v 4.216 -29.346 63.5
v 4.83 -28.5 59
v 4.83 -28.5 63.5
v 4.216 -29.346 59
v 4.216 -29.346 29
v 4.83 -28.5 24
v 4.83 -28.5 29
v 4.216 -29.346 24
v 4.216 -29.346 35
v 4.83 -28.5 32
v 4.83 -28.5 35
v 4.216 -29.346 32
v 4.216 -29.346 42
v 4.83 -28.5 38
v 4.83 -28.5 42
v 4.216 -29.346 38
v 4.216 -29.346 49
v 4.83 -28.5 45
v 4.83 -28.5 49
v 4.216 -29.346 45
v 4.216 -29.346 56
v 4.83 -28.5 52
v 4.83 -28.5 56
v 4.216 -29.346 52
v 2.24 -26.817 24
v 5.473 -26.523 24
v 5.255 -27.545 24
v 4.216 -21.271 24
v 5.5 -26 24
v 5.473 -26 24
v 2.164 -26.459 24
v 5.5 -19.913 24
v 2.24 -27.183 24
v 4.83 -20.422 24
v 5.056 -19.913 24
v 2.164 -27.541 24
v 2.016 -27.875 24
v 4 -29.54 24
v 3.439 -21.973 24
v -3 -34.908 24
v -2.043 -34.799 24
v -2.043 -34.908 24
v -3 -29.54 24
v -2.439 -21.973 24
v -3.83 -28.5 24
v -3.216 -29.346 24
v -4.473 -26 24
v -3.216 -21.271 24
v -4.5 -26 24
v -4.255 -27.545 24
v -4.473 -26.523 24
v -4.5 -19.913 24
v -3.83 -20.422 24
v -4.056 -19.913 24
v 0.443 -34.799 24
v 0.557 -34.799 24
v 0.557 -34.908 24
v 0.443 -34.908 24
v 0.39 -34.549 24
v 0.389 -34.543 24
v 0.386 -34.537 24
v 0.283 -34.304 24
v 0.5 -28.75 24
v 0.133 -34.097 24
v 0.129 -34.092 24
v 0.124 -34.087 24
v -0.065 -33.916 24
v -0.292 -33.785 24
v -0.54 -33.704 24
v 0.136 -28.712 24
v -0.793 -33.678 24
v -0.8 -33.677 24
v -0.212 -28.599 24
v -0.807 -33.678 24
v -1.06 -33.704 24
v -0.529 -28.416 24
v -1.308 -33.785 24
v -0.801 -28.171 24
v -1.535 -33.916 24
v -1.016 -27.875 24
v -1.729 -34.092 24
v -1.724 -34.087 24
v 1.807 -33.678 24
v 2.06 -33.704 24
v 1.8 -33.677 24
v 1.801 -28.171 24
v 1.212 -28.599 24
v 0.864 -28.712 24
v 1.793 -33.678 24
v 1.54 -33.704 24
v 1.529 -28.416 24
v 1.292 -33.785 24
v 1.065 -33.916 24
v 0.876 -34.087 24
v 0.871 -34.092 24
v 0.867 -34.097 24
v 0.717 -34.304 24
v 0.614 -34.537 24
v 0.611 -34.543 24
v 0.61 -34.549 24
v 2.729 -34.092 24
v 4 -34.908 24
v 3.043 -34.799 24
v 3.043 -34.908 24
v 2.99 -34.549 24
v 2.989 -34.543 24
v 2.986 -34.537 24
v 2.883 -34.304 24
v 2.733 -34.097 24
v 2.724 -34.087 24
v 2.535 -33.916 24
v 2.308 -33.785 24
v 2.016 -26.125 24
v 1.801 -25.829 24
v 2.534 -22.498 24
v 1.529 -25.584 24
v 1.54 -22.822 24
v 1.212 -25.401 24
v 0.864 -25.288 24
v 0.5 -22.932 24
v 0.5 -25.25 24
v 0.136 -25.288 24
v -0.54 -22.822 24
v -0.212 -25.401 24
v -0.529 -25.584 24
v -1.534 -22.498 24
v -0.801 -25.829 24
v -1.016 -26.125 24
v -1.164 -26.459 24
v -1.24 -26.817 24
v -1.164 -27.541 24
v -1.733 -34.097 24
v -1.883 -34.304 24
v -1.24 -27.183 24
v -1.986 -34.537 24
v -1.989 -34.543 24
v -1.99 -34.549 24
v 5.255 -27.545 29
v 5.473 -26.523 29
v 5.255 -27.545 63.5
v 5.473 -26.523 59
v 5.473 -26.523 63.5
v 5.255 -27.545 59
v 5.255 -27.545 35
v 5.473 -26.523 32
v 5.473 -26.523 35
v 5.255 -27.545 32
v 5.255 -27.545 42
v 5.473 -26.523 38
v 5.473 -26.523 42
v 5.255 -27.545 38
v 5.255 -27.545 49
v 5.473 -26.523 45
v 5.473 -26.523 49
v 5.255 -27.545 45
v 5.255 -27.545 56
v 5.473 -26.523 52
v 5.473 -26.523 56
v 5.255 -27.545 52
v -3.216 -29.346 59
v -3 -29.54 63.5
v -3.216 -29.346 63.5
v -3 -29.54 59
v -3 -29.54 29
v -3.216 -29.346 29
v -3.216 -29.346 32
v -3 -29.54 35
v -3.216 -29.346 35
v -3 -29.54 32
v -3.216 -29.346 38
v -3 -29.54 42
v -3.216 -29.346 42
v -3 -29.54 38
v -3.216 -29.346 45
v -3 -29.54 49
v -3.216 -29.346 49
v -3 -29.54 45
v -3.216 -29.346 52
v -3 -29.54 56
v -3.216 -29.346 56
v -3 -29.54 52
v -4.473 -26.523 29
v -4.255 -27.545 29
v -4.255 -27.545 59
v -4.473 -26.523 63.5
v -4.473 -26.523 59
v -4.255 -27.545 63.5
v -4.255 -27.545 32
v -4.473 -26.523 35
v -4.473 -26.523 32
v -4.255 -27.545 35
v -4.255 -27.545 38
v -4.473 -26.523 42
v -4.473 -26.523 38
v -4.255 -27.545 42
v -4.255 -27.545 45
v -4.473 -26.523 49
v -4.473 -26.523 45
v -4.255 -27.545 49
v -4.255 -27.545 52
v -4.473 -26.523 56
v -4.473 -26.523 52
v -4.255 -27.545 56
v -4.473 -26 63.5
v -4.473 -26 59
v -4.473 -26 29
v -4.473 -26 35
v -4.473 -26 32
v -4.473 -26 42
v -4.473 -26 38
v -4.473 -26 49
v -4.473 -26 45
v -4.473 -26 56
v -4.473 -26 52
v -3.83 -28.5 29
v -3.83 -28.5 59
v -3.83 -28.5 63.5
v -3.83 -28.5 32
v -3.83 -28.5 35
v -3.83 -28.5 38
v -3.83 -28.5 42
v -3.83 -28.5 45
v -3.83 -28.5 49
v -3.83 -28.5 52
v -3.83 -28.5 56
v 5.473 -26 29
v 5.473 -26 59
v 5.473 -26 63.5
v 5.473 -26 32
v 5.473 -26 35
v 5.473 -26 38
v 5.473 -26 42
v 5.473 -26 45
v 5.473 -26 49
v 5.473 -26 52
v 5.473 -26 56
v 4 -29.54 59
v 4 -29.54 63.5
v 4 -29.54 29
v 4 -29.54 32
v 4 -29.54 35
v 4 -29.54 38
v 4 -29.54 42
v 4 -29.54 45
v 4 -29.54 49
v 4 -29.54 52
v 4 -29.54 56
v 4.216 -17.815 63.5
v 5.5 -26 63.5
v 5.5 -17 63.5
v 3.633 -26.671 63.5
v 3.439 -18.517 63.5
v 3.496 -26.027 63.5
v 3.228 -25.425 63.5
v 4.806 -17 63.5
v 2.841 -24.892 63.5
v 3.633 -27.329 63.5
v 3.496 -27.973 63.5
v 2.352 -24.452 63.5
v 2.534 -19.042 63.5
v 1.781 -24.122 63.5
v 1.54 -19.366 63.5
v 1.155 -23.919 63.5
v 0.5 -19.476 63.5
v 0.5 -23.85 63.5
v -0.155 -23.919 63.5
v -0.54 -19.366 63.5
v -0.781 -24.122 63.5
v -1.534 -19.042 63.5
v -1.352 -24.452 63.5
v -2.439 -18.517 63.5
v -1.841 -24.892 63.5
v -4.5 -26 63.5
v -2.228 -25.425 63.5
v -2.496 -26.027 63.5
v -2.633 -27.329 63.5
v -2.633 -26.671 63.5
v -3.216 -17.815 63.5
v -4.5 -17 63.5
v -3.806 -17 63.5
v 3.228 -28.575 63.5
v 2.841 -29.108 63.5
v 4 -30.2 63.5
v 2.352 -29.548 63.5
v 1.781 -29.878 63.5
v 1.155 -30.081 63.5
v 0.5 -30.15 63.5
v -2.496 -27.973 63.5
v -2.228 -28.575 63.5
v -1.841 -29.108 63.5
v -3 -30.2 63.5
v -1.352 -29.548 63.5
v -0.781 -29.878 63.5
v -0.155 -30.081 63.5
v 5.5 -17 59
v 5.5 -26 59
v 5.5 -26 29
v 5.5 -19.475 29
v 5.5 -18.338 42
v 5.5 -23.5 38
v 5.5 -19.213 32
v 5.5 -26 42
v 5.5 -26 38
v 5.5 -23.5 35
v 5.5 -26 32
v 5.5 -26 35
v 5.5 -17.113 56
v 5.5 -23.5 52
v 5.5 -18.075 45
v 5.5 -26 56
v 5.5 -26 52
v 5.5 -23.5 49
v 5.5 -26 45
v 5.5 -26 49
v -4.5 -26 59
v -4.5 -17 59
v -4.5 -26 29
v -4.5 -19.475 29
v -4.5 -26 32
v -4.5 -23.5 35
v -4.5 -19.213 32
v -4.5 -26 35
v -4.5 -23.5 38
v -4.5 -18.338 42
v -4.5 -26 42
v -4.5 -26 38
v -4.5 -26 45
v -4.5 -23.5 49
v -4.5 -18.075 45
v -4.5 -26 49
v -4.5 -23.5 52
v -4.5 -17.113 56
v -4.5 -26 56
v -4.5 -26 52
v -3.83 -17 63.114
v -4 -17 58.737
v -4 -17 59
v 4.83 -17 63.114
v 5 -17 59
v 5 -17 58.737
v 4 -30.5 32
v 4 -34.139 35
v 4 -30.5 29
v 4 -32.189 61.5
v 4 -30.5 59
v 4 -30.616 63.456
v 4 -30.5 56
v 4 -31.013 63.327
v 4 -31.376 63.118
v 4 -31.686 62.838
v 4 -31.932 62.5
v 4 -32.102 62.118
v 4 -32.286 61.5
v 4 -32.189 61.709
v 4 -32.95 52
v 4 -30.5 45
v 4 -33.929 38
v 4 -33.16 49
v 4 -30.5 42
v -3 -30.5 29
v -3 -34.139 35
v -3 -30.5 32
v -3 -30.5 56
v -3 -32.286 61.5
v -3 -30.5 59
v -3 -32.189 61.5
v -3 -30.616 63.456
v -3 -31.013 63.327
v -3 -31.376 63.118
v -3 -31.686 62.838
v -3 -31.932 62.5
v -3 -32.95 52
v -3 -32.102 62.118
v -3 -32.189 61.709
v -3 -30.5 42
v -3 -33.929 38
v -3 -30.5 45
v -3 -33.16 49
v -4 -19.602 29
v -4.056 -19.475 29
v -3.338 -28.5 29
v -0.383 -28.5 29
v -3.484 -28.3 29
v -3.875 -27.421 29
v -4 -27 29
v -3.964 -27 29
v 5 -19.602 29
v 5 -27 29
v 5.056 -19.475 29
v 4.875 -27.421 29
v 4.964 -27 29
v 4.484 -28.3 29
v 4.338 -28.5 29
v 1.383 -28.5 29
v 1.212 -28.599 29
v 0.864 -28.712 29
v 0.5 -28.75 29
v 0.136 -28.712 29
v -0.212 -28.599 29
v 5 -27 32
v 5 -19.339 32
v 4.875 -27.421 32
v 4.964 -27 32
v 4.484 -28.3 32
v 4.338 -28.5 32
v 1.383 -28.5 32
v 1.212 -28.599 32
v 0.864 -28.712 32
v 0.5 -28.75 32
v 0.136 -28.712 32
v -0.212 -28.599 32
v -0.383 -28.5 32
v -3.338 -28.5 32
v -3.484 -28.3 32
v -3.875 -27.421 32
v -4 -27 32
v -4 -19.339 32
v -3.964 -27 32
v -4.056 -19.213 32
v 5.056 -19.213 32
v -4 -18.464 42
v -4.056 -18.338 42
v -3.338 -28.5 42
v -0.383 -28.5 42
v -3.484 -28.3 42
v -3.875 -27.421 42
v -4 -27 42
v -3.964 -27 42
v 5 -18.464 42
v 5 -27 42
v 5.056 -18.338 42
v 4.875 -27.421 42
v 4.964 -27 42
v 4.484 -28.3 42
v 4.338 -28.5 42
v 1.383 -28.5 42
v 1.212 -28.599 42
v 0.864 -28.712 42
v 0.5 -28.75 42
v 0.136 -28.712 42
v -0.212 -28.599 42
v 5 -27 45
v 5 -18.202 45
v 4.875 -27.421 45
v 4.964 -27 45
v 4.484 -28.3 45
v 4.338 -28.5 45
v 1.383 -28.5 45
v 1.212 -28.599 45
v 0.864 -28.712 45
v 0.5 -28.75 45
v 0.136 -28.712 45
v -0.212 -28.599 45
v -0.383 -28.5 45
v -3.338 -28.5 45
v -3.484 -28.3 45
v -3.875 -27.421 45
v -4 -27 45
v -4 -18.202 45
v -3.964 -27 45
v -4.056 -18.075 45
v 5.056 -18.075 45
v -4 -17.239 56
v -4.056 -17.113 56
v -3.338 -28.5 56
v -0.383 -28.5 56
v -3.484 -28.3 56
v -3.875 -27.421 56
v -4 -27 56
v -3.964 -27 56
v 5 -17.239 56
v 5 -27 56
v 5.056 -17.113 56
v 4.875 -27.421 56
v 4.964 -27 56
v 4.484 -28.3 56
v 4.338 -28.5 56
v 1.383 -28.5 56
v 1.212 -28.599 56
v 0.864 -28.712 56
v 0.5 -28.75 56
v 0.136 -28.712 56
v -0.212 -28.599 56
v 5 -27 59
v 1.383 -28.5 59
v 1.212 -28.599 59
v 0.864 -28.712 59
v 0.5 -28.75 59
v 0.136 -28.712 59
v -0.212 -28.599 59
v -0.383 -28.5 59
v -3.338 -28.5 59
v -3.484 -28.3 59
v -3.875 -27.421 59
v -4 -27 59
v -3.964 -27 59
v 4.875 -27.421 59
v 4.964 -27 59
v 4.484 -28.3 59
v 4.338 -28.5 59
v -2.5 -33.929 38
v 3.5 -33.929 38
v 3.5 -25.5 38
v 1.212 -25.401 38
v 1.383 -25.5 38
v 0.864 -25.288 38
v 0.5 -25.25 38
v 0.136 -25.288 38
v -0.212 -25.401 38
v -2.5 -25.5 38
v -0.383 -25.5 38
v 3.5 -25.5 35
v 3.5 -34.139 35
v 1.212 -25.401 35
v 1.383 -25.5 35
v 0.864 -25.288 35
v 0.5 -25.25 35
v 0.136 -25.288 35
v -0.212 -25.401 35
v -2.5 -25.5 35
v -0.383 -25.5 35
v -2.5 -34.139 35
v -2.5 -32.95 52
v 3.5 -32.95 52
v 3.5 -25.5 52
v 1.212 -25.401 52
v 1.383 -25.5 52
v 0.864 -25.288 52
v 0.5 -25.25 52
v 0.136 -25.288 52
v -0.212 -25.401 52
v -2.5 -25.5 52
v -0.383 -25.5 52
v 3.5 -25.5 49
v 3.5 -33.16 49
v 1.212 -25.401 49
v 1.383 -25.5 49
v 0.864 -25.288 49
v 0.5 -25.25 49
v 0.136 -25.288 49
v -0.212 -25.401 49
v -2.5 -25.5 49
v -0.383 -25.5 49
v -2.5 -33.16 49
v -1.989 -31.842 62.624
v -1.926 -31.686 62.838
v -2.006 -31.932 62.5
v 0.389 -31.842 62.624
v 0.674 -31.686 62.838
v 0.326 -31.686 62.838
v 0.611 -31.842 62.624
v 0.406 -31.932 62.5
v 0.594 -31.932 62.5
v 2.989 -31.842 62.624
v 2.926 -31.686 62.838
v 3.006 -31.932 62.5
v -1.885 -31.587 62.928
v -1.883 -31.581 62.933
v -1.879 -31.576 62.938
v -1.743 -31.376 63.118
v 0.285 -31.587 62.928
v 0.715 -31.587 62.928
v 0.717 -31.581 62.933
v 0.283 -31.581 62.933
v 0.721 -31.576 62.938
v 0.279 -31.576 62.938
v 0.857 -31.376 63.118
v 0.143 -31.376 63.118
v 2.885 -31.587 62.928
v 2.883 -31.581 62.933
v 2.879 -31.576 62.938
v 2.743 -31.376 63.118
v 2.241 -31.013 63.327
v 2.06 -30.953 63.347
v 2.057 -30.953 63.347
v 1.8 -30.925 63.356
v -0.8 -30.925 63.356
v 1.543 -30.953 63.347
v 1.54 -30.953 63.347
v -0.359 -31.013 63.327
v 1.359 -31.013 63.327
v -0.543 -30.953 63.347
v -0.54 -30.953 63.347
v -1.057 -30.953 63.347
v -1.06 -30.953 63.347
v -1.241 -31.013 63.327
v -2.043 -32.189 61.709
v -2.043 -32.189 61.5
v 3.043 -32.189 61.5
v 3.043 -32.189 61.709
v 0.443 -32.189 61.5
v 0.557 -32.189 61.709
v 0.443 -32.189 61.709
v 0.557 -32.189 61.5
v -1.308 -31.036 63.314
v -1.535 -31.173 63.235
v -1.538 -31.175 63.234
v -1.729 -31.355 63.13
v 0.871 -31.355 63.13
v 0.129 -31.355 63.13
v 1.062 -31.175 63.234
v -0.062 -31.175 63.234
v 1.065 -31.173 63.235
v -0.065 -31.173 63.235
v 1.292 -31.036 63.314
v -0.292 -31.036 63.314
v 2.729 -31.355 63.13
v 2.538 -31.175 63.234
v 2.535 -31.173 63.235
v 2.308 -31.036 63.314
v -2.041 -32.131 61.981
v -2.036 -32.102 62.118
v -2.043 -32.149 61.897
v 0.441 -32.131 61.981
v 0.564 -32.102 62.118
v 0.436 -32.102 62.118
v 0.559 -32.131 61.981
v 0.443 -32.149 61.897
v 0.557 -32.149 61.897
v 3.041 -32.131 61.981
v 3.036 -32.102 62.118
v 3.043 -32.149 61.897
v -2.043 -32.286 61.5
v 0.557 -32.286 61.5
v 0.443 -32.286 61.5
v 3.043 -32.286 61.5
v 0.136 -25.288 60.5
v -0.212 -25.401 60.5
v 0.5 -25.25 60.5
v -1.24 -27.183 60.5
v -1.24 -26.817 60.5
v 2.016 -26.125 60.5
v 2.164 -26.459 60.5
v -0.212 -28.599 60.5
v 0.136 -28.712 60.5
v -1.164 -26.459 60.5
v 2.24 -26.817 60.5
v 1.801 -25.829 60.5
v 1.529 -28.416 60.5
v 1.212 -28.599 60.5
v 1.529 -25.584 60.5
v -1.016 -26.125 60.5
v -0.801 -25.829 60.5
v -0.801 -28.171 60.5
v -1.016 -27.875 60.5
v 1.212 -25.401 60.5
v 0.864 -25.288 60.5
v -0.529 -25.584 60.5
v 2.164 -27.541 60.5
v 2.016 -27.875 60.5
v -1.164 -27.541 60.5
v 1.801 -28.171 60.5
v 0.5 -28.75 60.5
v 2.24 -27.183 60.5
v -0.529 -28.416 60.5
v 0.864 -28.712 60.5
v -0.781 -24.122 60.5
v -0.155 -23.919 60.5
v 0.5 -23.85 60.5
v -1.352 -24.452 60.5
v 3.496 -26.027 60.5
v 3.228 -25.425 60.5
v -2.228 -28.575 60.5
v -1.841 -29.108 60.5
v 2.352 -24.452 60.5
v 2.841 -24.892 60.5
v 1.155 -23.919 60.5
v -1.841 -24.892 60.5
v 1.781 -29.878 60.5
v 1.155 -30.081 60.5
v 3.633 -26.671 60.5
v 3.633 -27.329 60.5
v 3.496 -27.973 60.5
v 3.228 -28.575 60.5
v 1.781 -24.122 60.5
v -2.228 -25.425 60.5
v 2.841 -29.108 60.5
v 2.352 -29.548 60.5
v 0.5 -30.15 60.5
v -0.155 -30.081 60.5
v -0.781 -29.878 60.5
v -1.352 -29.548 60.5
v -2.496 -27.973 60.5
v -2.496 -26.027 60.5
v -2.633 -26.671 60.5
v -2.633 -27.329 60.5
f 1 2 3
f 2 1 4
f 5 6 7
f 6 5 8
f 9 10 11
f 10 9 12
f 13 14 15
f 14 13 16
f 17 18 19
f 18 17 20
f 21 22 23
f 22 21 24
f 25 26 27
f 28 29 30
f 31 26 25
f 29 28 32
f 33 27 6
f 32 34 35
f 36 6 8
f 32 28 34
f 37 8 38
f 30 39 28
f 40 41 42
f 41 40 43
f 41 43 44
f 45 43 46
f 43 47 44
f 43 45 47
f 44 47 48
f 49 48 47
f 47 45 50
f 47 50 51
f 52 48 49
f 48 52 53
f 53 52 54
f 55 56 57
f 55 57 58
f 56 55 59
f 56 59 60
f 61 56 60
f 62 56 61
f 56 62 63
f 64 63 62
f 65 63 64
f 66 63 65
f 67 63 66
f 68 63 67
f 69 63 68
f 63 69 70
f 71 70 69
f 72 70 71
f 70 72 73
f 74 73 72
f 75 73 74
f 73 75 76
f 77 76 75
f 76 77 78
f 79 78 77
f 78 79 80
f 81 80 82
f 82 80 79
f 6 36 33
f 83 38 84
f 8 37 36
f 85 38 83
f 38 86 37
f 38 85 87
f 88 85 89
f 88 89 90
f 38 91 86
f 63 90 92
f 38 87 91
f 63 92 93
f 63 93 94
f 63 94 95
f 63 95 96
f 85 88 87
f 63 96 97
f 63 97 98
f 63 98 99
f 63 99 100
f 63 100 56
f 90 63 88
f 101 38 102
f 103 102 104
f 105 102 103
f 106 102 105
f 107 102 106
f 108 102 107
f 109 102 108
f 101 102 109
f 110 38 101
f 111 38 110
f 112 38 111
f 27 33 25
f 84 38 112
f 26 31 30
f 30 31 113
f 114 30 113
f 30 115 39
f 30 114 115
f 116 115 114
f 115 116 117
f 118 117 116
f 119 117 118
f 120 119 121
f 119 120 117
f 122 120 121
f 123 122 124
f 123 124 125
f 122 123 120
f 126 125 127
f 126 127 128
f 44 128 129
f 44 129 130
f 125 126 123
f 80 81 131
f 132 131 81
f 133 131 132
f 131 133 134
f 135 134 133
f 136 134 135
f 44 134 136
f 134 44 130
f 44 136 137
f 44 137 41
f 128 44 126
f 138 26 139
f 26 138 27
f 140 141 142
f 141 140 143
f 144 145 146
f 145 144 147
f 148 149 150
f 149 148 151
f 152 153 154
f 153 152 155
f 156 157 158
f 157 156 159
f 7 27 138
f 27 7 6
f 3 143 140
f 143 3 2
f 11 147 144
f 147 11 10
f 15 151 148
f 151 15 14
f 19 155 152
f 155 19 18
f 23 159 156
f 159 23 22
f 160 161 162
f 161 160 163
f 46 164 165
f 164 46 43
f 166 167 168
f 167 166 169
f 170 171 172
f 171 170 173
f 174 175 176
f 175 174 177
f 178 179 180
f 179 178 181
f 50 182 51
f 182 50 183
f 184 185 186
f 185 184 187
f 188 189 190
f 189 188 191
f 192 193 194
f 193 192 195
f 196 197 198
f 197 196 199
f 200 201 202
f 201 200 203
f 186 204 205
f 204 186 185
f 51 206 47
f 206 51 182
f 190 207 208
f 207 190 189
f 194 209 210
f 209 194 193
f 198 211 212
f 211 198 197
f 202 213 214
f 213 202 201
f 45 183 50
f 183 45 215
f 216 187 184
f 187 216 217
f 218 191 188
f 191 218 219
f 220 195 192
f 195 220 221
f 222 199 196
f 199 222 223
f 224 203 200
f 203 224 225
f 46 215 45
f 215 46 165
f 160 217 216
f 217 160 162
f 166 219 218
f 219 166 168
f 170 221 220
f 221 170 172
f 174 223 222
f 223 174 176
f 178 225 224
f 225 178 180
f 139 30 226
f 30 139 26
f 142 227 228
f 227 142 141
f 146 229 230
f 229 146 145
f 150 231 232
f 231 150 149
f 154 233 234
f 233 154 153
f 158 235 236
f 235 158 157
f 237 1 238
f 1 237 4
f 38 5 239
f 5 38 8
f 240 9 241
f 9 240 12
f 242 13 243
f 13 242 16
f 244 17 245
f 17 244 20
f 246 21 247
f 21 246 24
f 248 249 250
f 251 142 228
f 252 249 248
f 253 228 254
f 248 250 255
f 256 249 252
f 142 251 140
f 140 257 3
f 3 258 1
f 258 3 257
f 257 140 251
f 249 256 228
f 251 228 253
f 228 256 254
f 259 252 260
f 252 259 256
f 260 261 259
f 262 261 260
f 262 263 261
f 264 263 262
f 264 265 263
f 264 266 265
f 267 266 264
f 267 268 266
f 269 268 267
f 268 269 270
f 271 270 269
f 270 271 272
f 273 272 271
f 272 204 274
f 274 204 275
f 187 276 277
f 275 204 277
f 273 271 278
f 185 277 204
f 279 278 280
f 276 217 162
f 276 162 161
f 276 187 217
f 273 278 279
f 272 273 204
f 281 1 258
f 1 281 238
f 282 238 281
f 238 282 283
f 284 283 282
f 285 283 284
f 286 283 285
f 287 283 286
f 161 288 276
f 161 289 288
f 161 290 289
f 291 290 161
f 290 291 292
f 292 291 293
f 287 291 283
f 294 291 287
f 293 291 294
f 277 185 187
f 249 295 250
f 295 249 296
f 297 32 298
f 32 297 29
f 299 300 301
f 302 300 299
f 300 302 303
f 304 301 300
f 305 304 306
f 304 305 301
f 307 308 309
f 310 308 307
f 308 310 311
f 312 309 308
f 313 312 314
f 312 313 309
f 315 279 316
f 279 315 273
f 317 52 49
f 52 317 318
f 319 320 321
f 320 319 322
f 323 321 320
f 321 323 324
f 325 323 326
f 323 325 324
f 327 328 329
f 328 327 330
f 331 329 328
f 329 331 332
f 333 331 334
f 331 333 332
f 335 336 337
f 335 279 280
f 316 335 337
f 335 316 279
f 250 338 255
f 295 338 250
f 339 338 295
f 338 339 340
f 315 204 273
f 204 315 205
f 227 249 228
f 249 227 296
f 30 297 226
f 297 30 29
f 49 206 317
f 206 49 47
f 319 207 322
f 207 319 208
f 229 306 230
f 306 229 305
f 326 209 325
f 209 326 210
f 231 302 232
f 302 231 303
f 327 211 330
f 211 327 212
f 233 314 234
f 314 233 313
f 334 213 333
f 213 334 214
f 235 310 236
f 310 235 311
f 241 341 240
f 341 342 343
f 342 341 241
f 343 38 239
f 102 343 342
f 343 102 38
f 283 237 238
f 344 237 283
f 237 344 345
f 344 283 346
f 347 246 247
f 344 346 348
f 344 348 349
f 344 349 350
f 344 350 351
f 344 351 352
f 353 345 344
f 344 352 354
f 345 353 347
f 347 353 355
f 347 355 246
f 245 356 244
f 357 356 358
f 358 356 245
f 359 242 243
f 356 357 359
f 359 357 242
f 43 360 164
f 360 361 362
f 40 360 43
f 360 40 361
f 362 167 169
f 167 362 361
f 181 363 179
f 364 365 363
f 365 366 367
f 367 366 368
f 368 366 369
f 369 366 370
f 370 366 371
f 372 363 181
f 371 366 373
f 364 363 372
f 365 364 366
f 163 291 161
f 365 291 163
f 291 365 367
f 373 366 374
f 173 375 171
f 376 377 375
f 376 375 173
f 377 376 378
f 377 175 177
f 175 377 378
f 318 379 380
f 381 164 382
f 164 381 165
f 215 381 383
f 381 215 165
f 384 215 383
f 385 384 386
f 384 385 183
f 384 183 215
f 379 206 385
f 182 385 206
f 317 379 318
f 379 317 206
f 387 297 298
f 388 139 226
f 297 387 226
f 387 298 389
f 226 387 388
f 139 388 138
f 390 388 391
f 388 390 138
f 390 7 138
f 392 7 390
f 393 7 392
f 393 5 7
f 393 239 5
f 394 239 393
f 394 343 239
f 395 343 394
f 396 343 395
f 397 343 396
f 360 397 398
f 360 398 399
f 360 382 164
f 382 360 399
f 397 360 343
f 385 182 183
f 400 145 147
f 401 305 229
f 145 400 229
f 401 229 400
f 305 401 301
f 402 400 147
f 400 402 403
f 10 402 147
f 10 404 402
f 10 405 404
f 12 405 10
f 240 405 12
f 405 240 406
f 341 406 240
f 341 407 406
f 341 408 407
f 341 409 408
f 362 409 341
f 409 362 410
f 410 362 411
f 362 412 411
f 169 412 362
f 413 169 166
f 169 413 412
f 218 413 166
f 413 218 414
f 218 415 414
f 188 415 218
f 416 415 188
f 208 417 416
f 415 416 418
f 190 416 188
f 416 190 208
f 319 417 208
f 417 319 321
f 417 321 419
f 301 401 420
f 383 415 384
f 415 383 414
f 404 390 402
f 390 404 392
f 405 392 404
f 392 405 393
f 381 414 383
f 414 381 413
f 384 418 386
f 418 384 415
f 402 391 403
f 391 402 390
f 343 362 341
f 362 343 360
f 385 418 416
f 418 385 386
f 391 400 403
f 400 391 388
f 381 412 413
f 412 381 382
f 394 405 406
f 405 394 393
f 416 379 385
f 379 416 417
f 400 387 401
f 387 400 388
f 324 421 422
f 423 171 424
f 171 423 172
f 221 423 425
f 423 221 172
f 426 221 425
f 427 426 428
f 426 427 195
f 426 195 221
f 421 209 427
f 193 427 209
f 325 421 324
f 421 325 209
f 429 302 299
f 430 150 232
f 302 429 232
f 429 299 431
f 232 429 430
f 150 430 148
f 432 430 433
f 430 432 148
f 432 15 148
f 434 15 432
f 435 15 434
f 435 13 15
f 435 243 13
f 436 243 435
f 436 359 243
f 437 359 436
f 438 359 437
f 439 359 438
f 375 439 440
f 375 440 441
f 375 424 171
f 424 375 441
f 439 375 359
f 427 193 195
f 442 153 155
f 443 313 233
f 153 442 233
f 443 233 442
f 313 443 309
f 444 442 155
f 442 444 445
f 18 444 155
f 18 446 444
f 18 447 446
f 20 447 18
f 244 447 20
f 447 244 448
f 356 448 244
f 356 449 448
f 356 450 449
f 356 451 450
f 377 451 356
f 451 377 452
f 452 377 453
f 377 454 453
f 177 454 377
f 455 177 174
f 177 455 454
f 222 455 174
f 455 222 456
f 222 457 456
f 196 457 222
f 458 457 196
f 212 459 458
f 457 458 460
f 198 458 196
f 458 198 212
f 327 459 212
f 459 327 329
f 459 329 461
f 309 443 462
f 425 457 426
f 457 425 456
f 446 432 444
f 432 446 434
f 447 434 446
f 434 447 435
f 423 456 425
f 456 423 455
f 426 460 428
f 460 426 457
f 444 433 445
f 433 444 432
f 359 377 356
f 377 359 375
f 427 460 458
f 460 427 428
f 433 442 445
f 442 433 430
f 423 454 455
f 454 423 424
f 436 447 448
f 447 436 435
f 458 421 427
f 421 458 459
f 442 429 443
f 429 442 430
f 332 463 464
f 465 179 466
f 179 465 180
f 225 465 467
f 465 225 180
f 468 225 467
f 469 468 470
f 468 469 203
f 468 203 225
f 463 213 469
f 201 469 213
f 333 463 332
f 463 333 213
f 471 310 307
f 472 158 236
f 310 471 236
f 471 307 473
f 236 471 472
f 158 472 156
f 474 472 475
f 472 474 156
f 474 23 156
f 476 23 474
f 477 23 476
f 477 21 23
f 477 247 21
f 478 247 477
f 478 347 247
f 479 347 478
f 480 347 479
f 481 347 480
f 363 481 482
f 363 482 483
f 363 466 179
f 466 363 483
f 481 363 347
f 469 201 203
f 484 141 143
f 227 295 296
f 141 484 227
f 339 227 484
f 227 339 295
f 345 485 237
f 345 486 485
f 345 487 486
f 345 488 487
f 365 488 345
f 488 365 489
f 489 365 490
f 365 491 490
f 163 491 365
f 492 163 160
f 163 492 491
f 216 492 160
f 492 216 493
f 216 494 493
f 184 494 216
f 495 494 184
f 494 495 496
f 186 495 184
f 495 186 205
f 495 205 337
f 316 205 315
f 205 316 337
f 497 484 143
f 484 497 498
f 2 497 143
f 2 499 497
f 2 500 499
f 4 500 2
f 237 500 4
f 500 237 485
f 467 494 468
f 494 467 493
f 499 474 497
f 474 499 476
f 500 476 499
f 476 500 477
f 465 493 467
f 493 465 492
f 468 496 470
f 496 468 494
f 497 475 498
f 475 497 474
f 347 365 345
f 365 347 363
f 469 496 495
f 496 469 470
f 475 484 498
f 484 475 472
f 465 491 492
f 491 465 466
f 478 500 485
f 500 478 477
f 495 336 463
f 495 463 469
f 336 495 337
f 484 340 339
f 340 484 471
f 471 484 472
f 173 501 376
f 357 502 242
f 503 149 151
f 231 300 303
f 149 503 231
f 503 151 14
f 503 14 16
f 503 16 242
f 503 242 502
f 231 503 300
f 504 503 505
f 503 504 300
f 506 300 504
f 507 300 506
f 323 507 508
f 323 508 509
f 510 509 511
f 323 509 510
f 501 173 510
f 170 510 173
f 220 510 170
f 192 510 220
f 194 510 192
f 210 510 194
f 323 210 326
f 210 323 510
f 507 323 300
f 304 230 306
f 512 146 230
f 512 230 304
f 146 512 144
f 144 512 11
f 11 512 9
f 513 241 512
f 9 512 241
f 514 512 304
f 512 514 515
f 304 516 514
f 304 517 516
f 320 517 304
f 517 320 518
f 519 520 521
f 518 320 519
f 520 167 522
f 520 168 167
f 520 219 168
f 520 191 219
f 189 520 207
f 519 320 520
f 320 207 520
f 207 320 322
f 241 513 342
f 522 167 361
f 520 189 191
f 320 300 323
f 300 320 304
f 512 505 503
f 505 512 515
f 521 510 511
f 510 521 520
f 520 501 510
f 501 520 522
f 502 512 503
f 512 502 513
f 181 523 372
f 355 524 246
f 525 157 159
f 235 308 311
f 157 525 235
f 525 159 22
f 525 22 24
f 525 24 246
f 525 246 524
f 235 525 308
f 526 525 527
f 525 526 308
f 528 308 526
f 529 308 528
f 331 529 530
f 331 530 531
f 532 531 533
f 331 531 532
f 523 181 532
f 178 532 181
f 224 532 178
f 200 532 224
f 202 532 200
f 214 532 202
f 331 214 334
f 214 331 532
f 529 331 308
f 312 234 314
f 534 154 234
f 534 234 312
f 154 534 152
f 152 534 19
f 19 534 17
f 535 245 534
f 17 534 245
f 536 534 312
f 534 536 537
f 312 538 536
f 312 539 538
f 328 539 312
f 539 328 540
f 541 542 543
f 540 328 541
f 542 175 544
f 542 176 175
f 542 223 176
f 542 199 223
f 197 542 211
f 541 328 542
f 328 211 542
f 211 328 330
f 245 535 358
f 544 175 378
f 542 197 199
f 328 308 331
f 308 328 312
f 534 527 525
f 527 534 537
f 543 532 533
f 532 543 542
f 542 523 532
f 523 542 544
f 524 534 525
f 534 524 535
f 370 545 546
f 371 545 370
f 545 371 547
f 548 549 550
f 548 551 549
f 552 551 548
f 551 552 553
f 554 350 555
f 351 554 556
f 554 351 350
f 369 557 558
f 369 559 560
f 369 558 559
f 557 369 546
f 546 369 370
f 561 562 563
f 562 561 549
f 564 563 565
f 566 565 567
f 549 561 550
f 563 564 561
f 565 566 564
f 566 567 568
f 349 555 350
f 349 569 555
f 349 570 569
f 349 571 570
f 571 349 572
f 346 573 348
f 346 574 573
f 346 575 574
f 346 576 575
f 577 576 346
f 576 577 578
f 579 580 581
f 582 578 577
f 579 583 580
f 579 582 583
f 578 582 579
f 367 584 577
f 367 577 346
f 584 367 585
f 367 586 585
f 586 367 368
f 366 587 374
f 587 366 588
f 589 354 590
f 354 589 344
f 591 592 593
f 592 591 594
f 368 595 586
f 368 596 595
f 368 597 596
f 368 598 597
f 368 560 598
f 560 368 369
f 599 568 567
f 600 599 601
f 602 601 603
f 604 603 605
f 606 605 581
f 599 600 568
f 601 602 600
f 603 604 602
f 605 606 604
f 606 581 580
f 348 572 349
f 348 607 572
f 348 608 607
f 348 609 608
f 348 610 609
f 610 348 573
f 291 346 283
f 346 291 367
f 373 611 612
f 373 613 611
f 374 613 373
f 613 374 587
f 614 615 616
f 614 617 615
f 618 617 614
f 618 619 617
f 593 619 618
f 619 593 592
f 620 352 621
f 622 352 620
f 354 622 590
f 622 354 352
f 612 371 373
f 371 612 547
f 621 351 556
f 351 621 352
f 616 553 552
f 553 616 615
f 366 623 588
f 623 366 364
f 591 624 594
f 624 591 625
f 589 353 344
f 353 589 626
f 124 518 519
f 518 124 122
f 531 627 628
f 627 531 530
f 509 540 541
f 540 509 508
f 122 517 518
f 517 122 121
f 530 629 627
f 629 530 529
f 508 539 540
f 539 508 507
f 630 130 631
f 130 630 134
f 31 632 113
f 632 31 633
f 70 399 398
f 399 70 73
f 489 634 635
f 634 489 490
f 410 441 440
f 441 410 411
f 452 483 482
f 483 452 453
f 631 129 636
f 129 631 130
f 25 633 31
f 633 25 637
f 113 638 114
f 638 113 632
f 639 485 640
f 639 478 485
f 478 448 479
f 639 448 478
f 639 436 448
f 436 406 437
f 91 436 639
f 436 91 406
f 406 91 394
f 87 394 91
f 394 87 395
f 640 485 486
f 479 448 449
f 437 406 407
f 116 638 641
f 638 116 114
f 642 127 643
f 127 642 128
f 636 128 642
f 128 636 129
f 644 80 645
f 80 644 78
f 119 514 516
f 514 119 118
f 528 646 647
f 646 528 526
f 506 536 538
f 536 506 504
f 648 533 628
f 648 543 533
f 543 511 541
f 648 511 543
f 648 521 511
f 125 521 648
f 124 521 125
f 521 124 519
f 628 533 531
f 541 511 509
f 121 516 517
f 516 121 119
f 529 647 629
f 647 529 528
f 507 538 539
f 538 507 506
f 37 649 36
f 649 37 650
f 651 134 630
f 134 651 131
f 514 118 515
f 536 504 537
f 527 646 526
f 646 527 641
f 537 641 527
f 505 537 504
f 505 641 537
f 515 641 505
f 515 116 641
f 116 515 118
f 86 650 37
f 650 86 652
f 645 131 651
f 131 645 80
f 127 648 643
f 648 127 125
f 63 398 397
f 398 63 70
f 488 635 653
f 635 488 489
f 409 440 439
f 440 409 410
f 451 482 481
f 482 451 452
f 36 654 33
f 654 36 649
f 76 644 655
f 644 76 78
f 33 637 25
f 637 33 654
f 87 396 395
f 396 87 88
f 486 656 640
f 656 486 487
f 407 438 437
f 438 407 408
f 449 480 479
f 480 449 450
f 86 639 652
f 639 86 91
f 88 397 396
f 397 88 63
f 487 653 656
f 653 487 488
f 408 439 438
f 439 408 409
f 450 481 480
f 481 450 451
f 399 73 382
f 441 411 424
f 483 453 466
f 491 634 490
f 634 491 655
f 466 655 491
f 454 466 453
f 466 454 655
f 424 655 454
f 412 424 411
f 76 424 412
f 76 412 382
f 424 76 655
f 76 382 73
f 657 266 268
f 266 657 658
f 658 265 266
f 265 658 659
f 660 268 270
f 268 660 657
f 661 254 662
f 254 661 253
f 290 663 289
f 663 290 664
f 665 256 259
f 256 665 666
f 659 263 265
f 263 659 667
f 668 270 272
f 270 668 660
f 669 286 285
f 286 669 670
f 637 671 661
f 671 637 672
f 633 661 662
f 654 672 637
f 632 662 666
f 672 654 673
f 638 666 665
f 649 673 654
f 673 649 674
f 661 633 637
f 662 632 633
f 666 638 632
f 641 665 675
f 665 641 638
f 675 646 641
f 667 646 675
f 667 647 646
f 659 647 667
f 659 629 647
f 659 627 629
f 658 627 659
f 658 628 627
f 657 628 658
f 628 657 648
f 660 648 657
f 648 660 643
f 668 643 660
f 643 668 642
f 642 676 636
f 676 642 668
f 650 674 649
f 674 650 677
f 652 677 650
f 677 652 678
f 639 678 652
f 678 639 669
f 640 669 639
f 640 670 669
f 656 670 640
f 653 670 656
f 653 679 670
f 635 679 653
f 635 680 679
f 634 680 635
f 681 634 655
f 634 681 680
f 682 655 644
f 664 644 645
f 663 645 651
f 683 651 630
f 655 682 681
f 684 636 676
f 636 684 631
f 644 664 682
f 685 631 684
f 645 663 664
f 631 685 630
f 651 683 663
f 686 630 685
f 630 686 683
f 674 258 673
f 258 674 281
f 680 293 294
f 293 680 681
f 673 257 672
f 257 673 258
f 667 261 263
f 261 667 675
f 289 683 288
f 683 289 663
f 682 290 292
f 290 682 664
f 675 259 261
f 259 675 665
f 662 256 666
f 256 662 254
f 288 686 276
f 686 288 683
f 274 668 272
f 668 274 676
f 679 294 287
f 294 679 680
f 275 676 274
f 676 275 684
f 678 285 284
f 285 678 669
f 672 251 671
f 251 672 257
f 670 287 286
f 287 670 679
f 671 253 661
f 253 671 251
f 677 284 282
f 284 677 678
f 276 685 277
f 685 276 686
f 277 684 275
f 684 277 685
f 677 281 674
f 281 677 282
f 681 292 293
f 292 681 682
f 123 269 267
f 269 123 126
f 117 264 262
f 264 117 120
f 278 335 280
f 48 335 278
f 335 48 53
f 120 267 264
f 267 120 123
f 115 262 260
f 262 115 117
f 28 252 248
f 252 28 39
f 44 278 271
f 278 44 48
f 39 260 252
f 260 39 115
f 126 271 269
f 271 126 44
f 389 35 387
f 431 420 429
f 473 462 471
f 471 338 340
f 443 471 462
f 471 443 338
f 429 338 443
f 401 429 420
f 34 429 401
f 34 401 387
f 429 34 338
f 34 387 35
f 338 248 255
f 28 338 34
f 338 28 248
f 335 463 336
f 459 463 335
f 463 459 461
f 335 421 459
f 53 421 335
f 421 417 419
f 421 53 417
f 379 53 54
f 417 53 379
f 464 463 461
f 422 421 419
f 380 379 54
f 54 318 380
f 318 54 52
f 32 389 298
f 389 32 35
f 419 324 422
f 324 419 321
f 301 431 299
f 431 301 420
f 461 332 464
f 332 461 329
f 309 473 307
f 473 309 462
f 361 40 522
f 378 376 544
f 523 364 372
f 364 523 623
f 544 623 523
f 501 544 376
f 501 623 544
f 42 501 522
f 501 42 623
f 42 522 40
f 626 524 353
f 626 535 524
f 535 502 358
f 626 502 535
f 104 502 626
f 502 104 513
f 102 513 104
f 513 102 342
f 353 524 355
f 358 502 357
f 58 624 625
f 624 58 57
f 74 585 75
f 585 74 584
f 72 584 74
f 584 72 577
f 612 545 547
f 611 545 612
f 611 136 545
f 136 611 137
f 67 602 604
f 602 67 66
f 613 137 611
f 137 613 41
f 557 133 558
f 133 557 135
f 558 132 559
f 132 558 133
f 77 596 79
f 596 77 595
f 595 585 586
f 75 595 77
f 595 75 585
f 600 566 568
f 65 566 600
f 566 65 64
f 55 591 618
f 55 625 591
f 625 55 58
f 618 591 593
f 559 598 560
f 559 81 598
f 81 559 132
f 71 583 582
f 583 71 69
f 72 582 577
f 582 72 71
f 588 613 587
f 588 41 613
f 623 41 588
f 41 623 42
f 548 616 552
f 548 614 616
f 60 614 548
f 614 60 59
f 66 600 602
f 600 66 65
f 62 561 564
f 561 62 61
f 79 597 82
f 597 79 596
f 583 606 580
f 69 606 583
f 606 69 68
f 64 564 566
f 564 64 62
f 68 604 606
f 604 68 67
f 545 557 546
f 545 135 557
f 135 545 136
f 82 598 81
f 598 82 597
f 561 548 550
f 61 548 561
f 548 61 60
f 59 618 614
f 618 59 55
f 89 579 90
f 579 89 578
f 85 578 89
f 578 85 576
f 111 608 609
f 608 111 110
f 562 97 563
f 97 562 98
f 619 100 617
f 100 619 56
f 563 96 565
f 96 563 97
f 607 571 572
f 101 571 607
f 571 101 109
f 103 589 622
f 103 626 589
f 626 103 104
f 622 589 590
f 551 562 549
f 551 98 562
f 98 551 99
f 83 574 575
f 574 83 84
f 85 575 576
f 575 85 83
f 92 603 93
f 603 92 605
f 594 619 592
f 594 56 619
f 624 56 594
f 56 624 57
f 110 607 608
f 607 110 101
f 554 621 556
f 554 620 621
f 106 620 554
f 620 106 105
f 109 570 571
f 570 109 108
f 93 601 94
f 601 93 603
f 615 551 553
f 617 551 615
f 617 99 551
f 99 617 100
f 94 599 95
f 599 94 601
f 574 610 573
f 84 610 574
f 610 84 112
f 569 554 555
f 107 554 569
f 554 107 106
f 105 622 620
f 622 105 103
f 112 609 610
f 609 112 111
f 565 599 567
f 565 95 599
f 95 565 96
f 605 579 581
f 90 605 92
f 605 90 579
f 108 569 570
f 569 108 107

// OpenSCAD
// PRUSA iteration4
// cable holder
// GNU GPL v3
// Josef Průša <iam@josefprusa.cz> and contributors
// http://www.reprap.org/wiki/Prusa_Mendel
// http://prusamendel.org


module zip_main()
{
    // ziptie cut for upper cables
    
    translate([-10,-30.5,24]) cube([20,2,3]);
    translate([-6,-30.5,24]) cube([2,20,3]);
    translate([5,-30.5,24]) cube([2,20,3]);
    
    difference()
    {
        translate([0.5,-26,24]) rotate([0,0,90]) cylinder( h=3, r=6, $fn=30 );
        translate([0.5,-26,23]) rotate([0,0,90]) cylinder( h=5, r=4.6, $fn=30 );
        translate([-10,-35.5,23]) cube([20,5,5]);        
        translate([-10,-27,23]) cube([20,10,5]);        
    }
}
    
    
module zip_ext_cables()    
{
    // ziptie cut for lower cables
    
    translate([-10,-25.5,24]) cube([20,2,3]);
    translate([-4.5,-45.5,24]) cube([2,20,3]);
    translate([3.5,-45.5,24]) cube([2,20,3]);
}


module cable_holder()
{    
    difference()
    {
        union()
        {
            // base block
            translate([0.5,-26,24]) rotate([0,0,90]) cylinder( h=39.5, r=5, $fn=30 );
            translate([-4.5,-26,24]) cube([10,9,39.5]);
            translate([-3,-35,24]) cube([7,10,39.5]);
        }
        
        // screw 
        translate([0.5,-27,19.5]) rotate([0,0,90]) cylinder( h=42, r=1.75, $fn=30 );
        translate([0.5,-27,19.5+41]) rotate([0,0,90]) cylinder( h=5, r=3.15, $fn=30 );

        // upper cables cut
        translate([0.5,-18,23]) rotate([0,5,90]) cylinder( h=41, r=5, $fn=30 );
        translate([-10,-20,23]) rotate([-5,0,0]) cube([20,9,45]);
        
        // lower angled cut
        translate([-10,-44,23]) rotate([-4,0,0]) cube([20,9,45]);
        
        // wires
        translate([-0.8,-35,23]) rotate([0,4,90]) cylinder( h=41, r=1.25, $fn=30 );
        translate([1.8,-35,23]) rotate([0,4,90]) cylinder( h=41, r=1.25, $fn=30 );


        // ziptie openings
        translate([0,0,5]) zip_main();
        translate([0,0,18]) zip_main();
        translate([0,0,32]) zip_main();
        translate([0,0,11]) zip_ext_cables();
        translate([0,0,25]) zip_ext_cables();

        // round edge cut
        translate([0,1.8,-1.5])
        difference()
        {
            translate([-10,-32,63]) rotate([0,90,0]) cylinder( h=41, r=4, $fn=30 );
            translate([-10,-32,63]) rotate([0,90,0]) cylinder( h=41, r=2, $fn=30 );
            translate([-10,-36,53]) rotate([0,0,0]) cube([20,9,10]);
            translate([-10,-32,58]) rotate([0,0,0]) cube([20,9,10]);
        }

    }
}

cable_holder();
